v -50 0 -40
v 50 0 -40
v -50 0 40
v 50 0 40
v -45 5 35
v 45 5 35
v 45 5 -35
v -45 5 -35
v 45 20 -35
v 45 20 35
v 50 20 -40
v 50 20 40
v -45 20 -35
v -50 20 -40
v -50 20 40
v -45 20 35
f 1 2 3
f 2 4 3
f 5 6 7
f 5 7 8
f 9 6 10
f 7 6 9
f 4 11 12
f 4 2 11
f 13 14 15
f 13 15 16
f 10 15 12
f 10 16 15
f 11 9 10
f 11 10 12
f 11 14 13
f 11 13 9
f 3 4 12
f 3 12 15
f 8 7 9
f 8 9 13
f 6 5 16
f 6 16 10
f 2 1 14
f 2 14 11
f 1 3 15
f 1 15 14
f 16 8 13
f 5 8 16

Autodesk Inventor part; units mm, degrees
ref_plane "YZ Plane" through (0, 0, 0) normal (1, 0, 0) x (0, 1, 0)
ref_plane "XZ Plane" through (0, 0, 0) normal (0, 1, 0) x (-1, 0, 0)
ref_plane "XY Plane" through (0, 0, 0) normal (0, 0, 1) x (1, 0, 0)
sketch "Skizze1" plane through (0, 0, 0) normal (0, 1, 0) x (-1, 0, 0)
  line L0 (-50, 40) -> (50, 40)
  line L1 (50, 40) -> (50, -40)
  line L2 (50, -40) -> (-50, -40)
  line L3 (-50, -40) -> (-50, 40)
  line L4 (-50, 40) -> (50, -40) construction
  line L5 (50, 40) -> (-50, -40) construction
  point P0 (0, 0)
  dimension "d0" = 100
  dimension "d1" = 80
extrude "Extrusion1" add sketch "Skizze1" along normal blind 5
sketch "Skizze2" plane through (0, 5, 0) normal (0, 1, 0) x (1, 0, 0)
  line L0 (-50, -40) -> (50, -40) projected
  line L1 (50, -40) -> (50, 40) projected
  line L2 (50, 40) -> (-50, 40) projected
  line L3 (-50, 40) -> (-50, -40) projected
  line L4 (-45, -35) -> (45, -35)
  line L5 (45, -35) -> (45, 35)
  line L6 (45, 35) -> (-45, 35)
  line L7 (-45, 35) -> (-45, -35)
  line L8 (-45, -35) -> (45, 35) construction
  line L9 (45, -35) -> (-45, 35) construction
  point P0 (0, 0)
  dimension "d4" = 90
  dimension "d5" = 70
extrude "Extrusion2" add sketch "Skizze2" along normal blind 15
properties part number "top"
